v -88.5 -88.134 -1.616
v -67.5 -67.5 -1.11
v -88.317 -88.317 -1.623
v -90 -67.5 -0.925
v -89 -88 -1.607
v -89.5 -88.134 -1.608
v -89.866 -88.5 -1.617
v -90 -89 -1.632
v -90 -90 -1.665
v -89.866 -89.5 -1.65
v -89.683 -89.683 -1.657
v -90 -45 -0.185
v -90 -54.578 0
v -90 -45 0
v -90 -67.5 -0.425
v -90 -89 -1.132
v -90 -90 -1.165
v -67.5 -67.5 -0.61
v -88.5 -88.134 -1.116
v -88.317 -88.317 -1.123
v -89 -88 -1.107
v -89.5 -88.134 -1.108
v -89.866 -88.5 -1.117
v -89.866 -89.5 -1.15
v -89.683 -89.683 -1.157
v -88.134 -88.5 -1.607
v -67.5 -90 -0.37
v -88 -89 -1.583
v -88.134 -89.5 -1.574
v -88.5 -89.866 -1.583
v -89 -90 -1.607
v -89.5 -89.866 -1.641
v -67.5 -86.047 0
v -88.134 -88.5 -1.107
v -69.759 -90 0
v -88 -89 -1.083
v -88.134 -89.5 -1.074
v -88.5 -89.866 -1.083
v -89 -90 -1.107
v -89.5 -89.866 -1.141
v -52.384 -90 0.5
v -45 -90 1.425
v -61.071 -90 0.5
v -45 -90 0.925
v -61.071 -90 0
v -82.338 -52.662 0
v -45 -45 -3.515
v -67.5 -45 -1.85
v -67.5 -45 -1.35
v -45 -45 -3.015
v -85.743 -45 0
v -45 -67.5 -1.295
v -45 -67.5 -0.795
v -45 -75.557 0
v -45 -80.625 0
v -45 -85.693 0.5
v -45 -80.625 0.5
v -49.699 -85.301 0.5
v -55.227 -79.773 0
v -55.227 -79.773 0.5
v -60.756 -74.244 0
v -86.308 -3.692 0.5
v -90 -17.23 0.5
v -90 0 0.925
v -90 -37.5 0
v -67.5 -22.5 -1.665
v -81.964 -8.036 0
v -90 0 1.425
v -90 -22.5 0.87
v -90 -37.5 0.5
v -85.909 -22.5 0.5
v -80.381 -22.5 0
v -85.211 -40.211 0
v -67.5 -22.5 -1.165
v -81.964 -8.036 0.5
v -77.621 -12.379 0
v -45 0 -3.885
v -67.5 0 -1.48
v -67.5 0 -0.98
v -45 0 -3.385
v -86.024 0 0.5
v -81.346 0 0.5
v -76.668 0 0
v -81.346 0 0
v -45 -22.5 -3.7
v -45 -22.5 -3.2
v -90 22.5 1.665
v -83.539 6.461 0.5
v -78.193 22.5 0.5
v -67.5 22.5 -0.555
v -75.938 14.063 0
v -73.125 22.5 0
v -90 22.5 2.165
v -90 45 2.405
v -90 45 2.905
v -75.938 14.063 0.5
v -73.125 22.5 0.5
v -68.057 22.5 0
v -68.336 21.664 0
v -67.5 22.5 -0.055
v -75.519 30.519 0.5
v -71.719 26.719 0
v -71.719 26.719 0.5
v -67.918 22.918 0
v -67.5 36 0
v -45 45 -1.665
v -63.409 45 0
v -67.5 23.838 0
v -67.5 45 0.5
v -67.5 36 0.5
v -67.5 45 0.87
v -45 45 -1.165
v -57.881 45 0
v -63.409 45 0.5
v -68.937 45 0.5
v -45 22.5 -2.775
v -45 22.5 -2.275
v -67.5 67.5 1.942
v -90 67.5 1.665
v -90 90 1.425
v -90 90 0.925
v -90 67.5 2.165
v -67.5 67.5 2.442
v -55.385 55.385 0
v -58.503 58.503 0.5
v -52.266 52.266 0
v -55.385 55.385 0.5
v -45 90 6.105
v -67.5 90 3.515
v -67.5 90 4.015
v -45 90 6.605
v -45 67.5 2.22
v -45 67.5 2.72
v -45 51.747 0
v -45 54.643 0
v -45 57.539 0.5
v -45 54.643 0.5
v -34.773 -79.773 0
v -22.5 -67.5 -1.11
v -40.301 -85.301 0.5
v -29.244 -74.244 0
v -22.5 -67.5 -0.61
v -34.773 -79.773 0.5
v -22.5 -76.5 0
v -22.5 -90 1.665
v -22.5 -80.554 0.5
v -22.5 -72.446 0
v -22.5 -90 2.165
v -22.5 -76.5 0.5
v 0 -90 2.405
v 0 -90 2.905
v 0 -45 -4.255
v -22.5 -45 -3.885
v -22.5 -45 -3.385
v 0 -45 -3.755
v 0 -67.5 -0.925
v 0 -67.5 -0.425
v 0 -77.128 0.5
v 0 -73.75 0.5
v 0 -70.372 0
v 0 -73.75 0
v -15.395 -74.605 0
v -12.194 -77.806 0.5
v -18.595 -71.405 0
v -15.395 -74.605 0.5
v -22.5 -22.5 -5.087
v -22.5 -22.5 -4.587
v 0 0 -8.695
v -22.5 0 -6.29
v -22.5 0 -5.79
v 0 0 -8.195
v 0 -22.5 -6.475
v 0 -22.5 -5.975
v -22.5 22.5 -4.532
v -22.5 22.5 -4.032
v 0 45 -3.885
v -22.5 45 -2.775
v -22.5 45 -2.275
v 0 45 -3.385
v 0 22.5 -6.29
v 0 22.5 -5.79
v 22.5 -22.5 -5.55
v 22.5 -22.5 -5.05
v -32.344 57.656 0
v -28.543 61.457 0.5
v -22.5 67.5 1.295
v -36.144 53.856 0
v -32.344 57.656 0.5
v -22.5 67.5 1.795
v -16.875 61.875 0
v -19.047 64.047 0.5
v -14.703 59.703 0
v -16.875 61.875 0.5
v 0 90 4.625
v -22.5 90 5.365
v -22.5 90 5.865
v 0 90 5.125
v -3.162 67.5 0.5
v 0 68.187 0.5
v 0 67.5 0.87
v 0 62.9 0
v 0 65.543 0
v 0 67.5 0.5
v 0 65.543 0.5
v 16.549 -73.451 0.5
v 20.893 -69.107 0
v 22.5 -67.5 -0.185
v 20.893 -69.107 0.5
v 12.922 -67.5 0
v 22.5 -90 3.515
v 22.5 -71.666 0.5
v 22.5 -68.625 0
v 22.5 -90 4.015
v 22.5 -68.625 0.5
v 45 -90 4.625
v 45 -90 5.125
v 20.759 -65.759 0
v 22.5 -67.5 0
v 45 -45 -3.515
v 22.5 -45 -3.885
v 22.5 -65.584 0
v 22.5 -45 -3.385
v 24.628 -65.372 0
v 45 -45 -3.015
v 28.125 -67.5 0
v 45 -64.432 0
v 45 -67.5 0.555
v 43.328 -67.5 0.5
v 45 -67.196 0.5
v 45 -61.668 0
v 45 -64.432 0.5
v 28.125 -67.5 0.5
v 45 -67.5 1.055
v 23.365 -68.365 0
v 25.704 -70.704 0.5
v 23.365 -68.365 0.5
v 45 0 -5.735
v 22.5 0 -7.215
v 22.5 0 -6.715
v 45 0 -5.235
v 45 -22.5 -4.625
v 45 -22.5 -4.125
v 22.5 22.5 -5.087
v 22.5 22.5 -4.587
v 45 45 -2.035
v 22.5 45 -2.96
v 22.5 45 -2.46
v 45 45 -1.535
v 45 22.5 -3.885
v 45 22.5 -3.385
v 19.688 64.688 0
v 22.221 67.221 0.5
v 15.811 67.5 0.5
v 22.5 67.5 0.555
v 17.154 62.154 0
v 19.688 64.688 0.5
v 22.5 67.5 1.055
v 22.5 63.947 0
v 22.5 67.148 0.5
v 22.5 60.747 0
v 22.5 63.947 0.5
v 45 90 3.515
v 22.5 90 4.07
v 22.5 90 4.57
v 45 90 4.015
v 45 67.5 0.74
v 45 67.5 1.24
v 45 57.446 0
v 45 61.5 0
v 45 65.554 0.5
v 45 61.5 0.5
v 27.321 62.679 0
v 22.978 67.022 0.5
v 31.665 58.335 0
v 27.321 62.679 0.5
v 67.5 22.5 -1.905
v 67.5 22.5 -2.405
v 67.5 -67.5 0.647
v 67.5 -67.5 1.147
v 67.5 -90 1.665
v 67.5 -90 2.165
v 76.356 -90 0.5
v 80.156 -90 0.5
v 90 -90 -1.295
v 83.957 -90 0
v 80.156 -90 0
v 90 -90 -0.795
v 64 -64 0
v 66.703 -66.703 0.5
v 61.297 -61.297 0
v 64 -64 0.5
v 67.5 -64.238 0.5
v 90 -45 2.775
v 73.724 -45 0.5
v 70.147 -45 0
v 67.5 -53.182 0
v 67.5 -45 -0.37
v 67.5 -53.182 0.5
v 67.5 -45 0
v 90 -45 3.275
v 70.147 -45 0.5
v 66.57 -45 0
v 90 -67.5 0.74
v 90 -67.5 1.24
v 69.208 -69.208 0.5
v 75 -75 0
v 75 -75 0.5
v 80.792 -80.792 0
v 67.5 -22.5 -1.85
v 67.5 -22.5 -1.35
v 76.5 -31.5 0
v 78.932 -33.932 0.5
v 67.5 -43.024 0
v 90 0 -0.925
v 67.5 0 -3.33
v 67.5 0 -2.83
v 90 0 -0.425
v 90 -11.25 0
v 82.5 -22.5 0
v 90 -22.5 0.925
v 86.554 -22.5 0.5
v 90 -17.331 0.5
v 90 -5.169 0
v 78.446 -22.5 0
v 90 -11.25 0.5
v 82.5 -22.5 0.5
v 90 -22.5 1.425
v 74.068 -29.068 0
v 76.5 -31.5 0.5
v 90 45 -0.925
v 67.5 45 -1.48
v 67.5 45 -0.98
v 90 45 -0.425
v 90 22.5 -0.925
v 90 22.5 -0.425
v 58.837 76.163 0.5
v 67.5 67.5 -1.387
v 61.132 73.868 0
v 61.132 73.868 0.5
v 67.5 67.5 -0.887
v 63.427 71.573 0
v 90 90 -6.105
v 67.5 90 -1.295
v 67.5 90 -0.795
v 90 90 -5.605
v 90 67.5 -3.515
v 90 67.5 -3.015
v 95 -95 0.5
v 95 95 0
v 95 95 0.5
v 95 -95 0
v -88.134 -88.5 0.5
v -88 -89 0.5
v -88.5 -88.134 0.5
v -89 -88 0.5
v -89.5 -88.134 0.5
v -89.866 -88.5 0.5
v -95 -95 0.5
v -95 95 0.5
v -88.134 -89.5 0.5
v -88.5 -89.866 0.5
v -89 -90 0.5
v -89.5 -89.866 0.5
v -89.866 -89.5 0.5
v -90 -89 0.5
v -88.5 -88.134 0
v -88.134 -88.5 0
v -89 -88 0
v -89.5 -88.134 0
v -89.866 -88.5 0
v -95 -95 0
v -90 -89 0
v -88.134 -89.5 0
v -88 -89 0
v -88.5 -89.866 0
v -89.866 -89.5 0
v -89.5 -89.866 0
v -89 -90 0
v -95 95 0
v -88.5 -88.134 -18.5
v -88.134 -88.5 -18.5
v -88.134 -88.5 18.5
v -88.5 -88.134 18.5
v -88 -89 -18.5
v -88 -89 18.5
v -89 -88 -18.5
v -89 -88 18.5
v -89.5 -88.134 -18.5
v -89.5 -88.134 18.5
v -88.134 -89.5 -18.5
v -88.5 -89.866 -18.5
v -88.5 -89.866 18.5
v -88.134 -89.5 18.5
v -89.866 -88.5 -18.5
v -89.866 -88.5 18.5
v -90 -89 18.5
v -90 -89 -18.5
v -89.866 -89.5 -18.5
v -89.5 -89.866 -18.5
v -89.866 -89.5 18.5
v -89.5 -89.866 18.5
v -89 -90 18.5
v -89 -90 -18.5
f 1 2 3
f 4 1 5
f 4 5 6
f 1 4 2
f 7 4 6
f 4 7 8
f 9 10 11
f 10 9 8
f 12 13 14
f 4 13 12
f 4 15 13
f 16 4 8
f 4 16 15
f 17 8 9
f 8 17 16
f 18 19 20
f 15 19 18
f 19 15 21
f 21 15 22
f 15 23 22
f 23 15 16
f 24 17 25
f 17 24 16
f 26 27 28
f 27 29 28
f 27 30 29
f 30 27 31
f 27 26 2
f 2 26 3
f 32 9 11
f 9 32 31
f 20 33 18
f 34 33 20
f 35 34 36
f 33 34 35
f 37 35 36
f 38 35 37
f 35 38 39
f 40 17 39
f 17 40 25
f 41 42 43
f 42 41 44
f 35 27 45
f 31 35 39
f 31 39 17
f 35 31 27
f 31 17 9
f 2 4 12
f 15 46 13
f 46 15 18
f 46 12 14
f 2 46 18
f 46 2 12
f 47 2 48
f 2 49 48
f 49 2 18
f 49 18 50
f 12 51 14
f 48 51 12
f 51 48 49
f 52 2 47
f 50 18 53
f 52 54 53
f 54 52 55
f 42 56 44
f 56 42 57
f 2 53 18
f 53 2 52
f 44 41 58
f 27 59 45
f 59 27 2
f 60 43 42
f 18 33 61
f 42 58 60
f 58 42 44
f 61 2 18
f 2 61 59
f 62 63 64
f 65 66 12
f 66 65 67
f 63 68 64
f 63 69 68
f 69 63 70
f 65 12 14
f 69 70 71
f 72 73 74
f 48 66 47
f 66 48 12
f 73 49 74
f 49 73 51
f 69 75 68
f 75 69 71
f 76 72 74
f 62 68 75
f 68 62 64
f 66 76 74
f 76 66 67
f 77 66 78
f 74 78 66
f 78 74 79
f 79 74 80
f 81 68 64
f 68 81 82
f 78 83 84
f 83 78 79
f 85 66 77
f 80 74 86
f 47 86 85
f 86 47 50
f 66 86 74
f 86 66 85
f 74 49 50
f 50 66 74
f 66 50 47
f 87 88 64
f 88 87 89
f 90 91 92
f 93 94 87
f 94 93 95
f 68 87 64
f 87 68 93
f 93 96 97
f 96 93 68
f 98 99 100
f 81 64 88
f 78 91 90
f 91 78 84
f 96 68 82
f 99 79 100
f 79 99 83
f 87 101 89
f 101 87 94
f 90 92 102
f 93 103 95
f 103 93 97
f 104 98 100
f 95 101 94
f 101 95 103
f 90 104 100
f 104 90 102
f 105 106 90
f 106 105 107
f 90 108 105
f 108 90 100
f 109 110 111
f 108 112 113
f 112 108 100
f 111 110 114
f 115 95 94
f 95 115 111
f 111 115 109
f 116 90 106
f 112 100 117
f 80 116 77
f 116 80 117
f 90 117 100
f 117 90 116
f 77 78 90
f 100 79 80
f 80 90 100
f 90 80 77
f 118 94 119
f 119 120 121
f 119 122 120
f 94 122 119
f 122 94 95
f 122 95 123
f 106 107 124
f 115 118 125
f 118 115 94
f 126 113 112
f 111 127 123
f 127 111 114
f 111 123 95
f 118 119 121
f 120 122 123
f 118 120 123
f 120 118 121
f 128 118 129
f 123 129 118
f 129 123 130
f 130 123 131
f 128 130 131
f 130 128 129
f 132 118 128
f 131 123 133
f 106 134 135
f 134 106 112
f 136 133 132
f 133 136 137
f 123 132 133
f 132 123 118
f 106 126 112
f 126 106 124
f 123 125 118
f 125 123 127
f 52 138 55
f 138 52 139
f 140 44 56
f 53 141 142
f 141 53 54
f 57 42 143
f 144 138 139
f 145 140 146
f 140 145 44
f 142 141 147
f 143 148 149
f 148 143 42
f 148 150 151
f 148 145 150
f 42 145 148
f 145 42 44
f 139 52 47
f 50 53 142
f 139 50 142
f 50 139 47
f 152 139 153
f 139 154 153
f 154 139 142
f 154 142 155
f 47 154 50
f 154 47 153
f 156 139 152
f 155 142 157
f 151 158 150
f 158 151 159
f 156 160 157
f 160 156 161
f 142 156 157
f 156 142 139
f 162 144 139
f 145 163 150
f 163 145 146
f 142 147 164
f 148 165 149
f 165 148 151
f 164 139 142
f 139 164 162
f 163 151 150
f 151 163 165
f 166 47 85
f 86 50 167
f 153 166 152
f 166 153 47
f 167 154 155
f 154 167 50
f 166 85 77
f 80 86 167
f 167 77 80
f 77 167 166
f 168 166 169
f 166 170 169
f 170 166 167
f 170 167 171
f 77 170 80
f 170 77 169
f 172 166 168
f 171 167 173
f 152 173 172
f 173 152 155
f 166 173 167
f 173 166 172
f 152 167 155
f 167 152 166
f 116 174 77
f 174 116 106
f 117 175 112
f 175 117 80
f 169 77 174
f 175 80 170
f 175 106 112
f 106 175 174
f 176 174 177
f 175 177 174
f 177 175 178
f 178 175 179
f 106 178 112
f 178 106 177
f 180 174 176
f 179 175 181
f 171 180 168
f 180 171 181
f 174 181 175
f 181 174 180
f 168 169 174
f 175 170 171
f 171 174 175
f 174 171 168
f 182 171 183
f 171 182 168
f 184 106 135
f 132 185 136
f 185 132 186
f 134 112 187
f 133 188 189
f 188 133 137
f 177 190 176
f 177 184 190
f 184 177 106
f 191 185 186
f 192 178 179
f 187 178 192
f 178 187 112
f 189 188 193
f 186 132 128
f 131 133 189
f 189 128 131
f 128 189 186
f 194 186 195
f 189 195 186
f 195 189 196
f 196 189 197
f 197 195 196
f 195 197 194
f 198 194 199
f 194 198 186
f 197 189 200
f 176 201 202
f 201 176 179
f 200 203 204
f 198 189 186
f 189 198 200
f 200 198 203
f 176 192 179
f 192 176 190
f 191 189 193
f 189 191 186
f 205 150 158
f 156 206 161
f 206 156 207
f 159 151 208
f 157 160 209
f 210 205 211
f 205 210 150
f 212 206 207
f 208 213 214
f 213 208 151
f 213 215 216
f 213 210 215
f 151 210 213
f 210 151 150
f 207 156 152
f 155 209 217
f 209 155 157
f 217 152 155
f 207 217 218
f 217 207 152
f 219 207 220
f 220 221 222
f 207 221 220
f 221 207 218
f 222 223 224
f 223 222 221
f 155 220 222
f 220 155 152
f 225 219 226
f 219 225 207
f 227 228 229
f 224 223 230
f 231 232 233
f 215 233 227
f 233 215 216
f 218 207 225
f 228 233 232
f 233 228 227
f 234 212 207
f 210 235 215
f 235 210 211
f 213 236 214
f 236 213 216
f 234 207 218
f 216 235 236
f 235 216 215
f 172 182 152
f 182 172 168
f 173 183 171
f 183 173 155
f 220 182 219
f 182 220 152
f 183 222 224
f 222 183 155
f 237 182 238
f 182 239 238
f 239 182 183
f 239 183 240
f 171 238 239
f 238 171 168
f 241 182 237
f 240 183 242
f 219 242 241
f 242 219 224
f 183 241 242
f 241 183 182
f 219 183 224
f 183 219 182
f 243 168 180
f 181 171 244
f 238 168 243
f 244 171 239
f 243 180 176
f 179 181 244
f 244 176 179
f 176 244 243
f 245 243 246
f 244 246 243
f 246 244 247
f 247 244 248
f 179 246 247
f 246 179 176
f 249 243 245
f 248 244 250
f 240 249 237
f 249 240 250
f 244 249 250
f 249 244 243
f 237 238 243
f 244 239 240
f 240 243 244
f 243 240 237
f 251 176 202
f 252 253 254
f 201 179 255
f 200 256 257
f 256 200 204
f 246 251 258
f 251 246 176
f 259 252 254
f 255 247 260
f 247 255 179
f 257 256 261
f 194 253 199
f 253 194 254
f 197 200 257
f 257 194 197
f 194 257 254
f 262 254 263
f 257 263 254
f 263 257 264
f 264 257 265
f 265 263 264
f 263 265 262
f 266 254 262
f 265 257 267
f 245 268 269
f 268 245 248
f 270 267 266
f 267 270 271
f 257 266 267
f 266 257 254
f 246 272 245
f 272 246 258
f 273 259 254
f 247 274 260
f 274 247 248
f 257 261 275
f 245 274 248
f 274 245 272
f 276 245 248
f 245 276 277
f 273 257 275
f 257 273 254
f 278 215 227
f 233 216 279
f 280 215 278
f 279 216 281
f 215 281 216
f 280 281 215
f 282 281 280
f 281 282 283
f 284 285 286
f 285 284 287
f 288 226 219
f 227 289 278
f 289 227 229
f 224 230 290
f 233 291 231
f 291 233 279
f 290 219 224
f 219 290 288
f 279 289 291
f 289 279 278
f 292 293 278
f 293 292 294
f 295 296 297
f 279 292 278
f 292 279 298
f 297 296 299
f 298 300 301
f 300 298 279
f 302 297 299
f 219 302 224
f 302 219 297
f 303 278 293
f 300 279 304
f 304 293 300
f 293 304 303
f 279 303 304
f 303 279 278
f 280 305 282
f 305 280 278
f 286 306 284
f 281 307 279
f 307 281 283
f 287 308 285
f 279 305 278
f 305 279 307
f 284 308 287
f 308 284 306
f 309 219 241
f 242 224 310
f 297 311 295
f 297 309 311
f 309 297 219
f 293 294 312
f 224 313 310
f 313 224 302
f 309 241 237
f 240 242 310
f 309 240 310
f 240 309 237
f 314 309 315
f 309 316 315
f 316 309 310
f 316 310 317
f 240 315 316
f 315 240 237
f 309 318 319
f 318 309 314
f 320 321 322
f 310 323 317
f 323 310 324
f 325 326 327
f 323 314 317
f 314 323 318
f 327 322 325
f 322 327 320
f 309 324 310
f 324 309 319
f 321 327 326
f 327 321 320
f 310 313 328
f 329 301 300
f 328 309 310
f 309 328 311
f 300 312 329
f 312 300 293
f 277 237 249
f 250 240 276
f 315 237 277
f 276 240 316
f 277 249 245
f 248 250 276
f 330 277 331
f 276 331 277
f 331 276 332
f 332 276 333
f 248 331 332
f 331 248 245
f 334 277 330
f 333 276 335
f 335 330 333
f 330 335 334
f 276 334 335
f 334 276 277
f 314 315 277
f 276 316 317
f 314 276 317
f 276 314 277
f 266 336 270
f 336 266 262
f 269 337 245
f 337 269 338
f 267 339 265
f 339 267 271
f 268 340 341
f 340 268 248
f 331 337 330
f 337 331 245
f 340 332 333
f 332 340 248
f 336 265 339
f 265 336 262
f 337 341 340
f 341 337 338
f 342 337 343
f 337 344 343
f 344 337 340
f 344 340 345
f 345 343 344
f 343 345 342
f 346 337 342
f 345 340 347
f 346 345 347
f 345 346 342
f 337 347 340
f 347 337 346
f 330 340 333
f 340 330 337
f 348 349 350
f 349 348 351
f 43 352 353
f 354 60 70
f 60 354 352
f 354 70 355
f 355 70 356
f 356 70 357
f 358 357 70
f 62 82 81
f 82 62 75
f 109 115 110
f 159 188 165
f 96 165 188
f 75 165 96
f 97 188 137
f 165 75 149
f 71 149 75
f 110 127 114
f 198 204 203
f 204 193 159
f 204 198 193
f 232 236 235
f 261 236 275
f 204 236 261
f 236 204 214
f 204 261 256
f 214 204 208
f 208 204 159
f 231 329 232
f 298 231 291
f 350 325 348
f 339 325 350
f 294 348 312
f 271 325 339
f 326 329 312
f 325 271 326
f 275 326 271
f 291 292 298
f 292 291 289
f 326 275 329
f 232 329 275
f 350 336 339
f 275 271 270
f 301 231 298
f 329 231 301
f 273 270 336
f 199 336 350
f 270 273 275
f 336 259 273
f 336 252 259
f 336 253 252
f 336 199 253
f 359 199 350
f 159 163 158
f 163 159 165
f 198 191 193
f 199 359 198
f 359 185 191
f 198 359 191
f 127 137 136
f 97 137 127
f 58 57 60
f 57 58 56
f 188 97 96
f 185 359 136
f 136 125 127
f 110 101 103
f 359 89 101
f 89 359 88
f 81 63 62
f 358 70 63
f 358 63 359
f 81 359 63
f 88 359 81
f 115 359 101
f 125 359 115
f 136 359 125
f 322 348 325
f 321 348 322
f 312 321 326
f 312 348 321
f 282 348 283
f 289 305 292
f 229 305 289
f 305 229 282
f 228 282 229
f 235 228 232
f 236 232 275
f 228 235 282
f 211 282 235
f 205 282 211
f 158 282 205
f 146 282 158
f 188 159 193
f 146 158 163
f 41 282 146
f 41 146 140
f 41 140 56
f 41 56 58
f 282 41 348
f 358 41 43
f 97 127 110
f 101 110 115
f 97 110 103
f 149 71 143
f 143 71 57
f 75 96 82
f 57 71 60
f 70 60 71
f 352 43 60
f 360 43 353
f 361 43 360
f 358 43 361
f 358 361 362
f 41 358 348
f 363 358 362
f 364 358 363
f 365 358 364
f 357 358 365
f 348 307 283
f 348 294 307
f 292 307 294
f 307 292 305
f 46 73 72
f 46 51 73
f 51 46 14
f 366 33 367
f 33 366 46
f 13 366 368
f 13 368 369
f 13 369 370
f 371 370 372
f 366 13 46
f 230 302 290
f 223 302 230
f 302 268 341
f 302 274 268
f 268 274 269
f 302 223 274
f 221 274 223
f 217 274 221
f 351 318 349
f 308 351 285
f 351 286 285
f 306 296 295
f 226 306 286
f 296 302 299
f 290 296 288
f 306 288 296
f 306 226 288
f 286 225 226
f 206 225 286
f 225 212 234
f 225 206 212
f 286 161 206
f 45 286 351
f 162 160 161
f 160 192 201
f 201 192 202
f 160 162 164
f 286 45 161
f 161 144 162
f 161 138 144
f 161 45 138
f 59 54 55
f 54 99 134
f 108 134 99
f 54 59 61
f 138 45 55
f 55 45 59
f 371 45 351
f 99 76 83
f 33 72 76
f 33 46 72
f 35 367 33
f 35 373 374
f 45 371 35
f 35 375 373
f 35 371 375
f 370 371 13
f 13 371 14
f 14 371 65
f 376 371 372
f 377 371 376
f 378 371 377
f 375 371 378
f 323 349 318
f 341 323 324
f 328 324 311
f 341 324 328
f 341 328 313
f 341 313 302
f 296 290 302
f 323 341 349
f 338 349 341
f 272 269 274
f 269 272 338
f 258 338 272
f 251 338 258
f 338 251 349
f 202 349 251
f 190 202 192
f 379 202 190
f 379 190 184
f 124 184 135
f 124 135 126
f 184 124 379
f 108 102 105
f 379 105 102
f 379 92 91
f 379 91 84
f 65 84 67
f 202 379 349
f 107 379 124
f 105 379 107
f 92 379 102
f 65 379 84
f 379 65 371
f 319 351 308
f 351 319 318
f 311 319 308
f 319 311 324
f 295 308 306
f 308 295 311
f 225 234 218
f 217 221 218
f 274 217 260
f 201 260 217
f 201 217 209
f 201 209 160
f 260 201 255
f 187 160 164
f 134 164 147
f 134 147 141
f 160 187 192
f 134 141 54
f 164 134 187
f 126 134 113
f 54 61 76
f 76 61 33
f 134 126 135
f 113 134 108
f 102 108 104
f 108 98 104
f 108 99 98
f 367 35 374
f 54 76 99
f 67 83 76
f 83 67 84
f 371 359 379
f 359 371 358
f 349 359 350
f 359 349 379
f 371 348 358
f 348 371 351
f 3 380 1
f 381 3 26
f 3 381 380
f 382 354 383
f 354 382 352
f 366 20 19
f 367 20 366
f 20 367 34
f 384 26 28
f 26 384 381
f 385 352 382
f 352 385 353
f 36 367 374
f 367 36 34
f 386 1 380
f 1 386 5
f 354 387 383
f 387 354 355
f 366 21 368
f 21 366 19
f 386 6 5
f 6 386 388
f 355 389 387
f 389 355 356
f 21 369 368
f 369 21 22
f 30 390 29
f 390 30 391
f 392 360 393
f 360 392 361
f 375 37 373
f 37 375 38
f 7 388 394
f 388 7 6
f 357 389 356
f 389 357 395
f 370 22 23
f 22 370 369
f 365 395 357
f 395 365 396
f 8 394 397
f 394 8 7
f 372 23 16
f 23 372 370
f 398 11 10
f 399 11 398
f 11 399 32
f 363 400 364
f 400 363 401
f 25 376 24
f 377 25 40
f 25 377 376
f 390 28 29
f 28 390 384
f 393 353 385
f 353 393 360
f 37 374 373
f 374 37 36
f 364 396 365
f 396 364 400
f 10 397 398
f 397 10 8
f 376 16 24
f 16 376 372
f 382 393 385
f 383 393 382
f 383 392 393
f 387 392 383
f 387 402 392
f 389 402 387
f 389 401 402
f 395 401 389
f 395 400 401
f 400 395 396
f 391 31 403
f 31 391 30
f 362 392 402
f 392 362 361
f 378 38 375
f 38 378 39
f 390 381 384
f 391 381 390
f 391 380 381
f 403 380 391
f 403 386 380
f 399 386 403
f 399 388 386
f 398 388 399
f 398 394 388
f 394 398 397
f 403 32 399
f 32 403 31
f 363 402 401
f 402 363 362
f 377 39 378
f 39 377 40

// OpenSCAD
 /**************************************\
 *                                      *
 *   OpenSCAD Mesh Display              *
 *   by Thinkyhead - April 2017         *
 *                                      *
 *   Copy the grid output from WRCNC,  *
 *   paste below as shown, and use      *
 *   OpenSCAD to see a visualization    *
 *   of your mesh.                      *
 *                                      *
 \**************************************/

$t = 0.15; // comment out during animation!
X = 0; Y = 1;
L = 0; R = 1; F = 2; B = 3;

//
// Sample Mesh - Replace with your own
//
measured_z = [
  [ -1.20, -1.13, -1.09, -1.03, -1.19 ],
  [ -1.16, -1.25, -1.27, -1.25, -1.08 ],
  [ -1.13, -1.26, -1.39, -1.31, -1.18 ],
  [ -1.09, -1.20, -1.26, -1.21, -1.18 ],
  [ -1.13, -0.99, -1.03, -1.06, -1.32 ]
];

//
// An offset to add to all points in the mesh
//
zadjust     = 0;

//
// Mesh characteristics
//
bed_size = [ 200, 200 ];

mesh_inset  = [ 10, 10, 10, 10 ]; // L, F, R, B

mesh_bounds = [
  [ mesh_inset[L], mesh_inset[F] ],
  [ bed_size[X] - mesh_inset[R], bed_size[Y] - mesh_inset[B] ]
];

mesh_size = mesh_bounds[1] - mesh_bounds[0];

                      // NOTE: WRCNC meshes already subtract the probe offset
NAN         = 0;      // Z to use for un-measured points

//
// Geometry
//

max_z_scale   = 100;   // Scale at Time 0.5
min_z_scale   = 10;    // Scale at Time 0.0 and 1.0
thickness     = 0.5;   // thickness of the mesh triangles
tesselation   = 1;     // levels of tesselation from 0-2
alternation   = 2;     // direction change modulus (try it)

//
// Appearance
//

show_plane    = true;
show_labels   = true;
show_coords   = true;
arrow_length  = 5;

label_font_lg = "Arial";
label_font_sm = "Arial";
mesh_color    = [1,1,1,0.5];
plane_color   = [0.4,0.6,0.9,0.6];

//================================================ Derive useful values

big_z = max_2D(measured_z,0);
lil_z = min_2D(measured_z,0);

mean_value = (big_z + lil_z) / 2.0;

mesh_points_y = len(measured_z);
mesh_points_x = len(measured_z[0]);

xspace = mesh_size[X] / (mesh_points_x - 1);
yspace = mesh_size[Y] / (mesh_points_y - 1);

// At $t=0 and $t=1 scale will be 100%
z_scale_factor = min_z_scale + (($t > 0.5) ? 1.0 - $t : $t) * (max_z_scale - min_z_scale) * 2;

//
// Min and max recursive functions for 1D and 2D arrays
// Return the smallest or largest value in the array
//
function some_1D(b,i) = (i<len(b)-1) ? (b[i] && some_1D(b,i+1)) : b[i] != 0;
function some_2D(a,j) = (j<len(a)-1) ? some_2D(a,j+1) : some_1D(a[j], 0);
function min_1D(b,i) = (i<len(b)-1) ? min(b[i], min_1D(b,i+1)) : b[i];
function min_2D(a,j) = (j<len(a)-1) ? min_2D(a,j+1) : min_1D(a[j], 0);
function max_1D(b,i) = (i<len(b)-1) ? max(b[i], max_1D(b,i+1)) : b[i];
function max_2D(a,j) = (j<len(a)-1) ? max_2D(a,j+1) : max_1D(a[j], 0);

//
// Get the corner probe points of a grid square.
//
// Input  : x,y grid indexes
// Output : An array of the 4 corner points
//
function grid_square(x,y) = [
  [x * xspace, y * yspace, z_scale_factor * (measured_z[y][x] - mean_value)],
  [x * xspace, (y+1) * yspace, z_scale_factor * (measured_z[y+1][x] - mean_value)],
  [(x+1) * xspace, (y+1) * yspace, z_scale_factor * (measured_z[y+1][x+1] - mean_value)],
  [(x+1) * xspace, y * yspace, z_scale_factor * (measured_z[y][x+1] - mean_value)]
];

// The corner point of a grid square with Z centered on the mean
function pos(x,y,z) = [x * xspace, y * yspace, z_scale_factor * (z - mean_value)];

//
// Draw the point markers and labels
//
module point_markers(show_home=true) {
  // Mark the home position 0,0
  if (show_home)
    translate([1,1]) color([0,0,0,0.25])
      cylinder(r=1, h=z_scale_factor, center=true);

  for (x=[0:mesh_points_x-1], y=[0:mesh_points_y-1]) {
    z = measured_z[y][x] - zadjust;
    down = z < mean_value;
    xyz = pos(x, y, z);
    translate([ xyz[0], xyz[1] ]) {

      // Show the XY as well as the Z!
      if (show_coords) {
        color("black")
        translate([0,0,0.5]) {
          $fn=8;
          rotate([0,0]) {
            posx = floor(mesh_bounds[0][X] + x * xspace);
            posy = floor(mesh_bounds[0][Y] + y * yspace);
            text(str(posx, ",", posy), 2, label_font_sm, halign="center", valign="center");
          }
        }
      }

      translate([ 0, 0, xyz[2] ]) {
        // Label each point with the Z
        v = z - mean_value;
        if (show_labels) {

          color(abs(v) < 0.1 ? [0,0.5,0] : [0.25,0,0])
          translate([0,0,down?-10:10]) {

            $fn=8;
            rotate([90,0])
              text(str(z), 6, label_font_lg, halign="center", valign="center");

            if (v)
              translate([0,0,down?-6:6]) rotate([90,0])
                text(str(down || !v ? "" : "+", v), 3, label_font_sm, halign="center", valign="center");
          }
        }

        // Show an arrow pointing up or down
        if (v) {
          rotate([0, down ? 180 : 0]) translate([0,0,-1])
            cylinder(
              r1=0.5,
              r2=0.1,
              h=arrow_length, $fn=12, center=1
            );
        }
        else
          color([1,0,1,0.4]) sphere(r=1.0, $fn=20, center=1);
      }
    }
  }
}

//
// Split a square on the diagonal into
// two triangles and render them.
//
//     s : a square
//   alt : a flag to split on the other diagonal
//
module tesselated_square(s, alt=false) {
  add = [0,0,thickness];
  p1 = [
    s[0], s[1], s[2], s[3],
    s[0]+add, s[1]+add, s[2]+add, s[3]+add
  ];
  f1 = alt
      ? [ [0,1,3], [4,5,1,0], [4,7,5], [5,7,3,1], [7,4,0,3] ]
      : [ [0,1,2], [4,5,1,0], [4,6,5], [5,6,2,1], [6,4,0,2] ];
  f2 = alt
      ? [ [1,2,3], [5,6,2,1], [5,6,7], [6,7,3,2], [7,5,1,3] ]
      : [ [0,2,3], [4,6,2,0], [4,7,6], [6,7,3,2], [7,4,0,3] ];

  // Use the other diagonal
  polyhedron(points=p1, faces=f1);
  polyhedron(points=p1, faces=f2);
}

/**
 * The simplest mesh display
 */
module simple_mesh(show_plane=show_plane) {
  if (show_plane) color(plane_color) cube([mesh_size[X], mesh_size[Y], thickness]);
  color(mesh_color)
    for (x=[0:mesh_points_x-2], y=[0:mesh_points_y-2])
      tesselated_square(grid_square(x, y));
}

/**
 * Subdivide the mesh into smaller squares.
 */
module bilinear_mesh(show_plane=show_plane,tesselation=tesselation) {
  if (show_plane) color(plane_color) translate([-5,-5]) cube([mesh_size[X]+10, mesh_size[Y]+10, thickness]);

  if (some_2D(measured_z, 0)) {

    tesselation = tesselation % 4;
    color(mesh_color)
    for (x=[0:mesh_points_x-2], y=[0:mesh_points_y-2]) {
      square = grid_square(x, y);
      if (tesselation < 1) {
        tesselated_square(square,(x%alternation)-(y%alternation));
      }
      else {
        subdiv_4 = subdivided_square(square);
        if (tesselation < 2) {
          for (i=[0:3]) tesselated_square(subdiv_4[i],i%alternation);
        }
        else {
          for (i=[0:3]) {
            subdiv_16 = subdivided_square(subdiv_4[i]);
            if (tesselation < 3) {
              for (j=[0:3]) tesselated_square(subdiv_16[j],j%alternation);
            }
            else {
              for (j=[0:3]) {
                subdiv_64 = subdivided_square(subdiv_16[j]);
                if (tesselation < 4) {
                  for (k=[0:3]) tesselated_square(subdiv_64[k]);
                }
              }
            }
          }
        }
      }
    }

  }
}

//
// Subdivision helpers
//
function ctrz(a) = (a[0][2]+a[1][2]+a[3][2]+a[2][2])/4;
function avgx(a,i) = (a[i][0]+a[(i+1)%4][0])/2;
function avgy(a,i) = (a[i][1]+a[(i+1)%4][1])/2;
function avgz(a,i) = (a[i][2]+a[(i+1)%4][2])/2;

//
// Convert one square into 4, applying bilinear averaging
//
// Input  : 1 square (4 points)
// Output : An array of 4 squares
//
function subdivided_square(a) = [
  [ // SW square
    a[0],                          // SW
    [a[0][0],avgy(a,0),avgz(a,0)], // CW
    [avgx(a,1),avgy(a,0),ctrz(a)], // CC
    [avgx(a,1),a[0][1],avgz(a,3)]  // SC
  ],
  [ // NW square
    [a[0][0],avgy(a,0),avgz(a,0)], // CW
    a[1],                          // NW
    [avgx(a,1),a[1][1],avgz(a,1)], // NC
    [avgx(a,1),avgy(a,0),ctrz(a)]  // CC
  ],
  [ // NE square
    [avgx(a,1),avgy(a,0),ctrz(a)], // CC
    [avgx(a,1),a[1][1],avgz(a,1)], // NC
    a[2],                          // NE
    [a[2][0],avgy(a,0),avgz(a,2)]  // CE
  ],
  [ // SE square
    [avgx(a,1),a[0][1],avgz(a,3)], // SC
    [avgx(a,1),avgy(a,0),ctrz(a)], // CC
    [a[2][0],avgy(a,0),avgz(a,2)], // CE
    a[3]                           // SE
  ]
];


//================================================ Run the plan

translate([-mesh_size[X] / 2, -mesh_size[Y] / 2]) {
  $fn = 12;
  point_markers();
  bilinear_mesh();
}
